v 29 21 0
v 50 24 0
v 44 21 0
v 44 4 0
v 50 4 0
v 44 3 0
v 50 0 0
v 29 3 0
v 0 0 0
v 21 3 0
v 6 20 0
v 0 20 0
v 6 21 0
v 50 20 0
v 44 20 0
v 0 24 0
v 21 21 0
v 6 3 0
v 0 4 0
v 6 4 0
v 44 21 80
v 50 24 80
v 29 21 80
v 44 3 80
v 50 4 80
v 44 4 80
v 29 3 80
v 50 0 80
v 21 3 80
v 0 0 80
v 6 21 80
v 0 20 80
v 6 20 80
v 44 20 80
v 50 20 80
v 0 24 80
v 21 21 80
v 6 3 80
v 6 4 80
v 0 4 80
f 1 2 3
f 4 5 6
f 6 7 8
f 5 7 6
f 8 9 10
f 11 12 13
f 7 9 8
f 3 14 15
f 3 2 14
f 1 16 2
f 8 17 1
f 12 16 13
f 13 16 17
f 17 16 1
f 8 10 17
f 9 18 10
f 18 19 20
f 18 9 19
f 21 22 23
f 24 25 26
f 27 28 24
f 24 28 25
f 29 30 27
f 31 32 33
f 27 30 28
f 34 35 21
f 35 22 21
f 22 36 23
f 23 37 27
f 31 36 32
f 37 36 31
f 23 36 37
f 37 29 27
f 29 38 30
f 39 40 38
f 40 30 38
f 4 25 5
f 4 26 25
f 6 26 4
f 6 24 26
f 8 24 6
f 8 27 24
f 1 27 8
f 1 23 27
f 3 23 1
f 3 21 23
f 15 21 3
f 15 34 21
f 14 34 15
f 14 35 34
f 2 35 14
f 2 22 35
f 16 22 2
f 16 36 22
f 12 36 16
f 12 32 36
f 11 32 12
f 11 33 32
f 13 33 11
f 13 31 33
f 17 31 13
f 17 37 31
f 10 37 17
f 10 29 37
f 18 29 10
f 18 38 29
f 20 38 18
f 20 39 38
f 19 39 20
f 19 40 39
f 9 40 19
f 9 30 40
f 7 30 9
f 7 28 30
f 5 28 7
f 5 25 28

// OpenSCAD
$fn = 32;

// ----------------------------------------------------------------------
// T-slot rail: 50 x 24 mm section, 80 mm long
// ----------------------------------------------------------------------

// --- parameters (mm) ---
profile_height = 80;      // extrusion height
profile_points = 20;      // points of the closed outline

profile = [[0, 0], [50, 0], [50, 4], [44, 4], [44, 3], [29, 3], [29, 21], [44, 21], [44, 20], [50, 20], [50, 24], [0, 24], [0, 20], [6, 20], [6, 21], [21, 21], [21, 3], [6, 3], [6, 4], [0, 4]];  // single closed polygon, 20 points, counter clockwise

// --- the one profile operation ---
linear_extrude(height = profile_height) polygon(points = profile);
